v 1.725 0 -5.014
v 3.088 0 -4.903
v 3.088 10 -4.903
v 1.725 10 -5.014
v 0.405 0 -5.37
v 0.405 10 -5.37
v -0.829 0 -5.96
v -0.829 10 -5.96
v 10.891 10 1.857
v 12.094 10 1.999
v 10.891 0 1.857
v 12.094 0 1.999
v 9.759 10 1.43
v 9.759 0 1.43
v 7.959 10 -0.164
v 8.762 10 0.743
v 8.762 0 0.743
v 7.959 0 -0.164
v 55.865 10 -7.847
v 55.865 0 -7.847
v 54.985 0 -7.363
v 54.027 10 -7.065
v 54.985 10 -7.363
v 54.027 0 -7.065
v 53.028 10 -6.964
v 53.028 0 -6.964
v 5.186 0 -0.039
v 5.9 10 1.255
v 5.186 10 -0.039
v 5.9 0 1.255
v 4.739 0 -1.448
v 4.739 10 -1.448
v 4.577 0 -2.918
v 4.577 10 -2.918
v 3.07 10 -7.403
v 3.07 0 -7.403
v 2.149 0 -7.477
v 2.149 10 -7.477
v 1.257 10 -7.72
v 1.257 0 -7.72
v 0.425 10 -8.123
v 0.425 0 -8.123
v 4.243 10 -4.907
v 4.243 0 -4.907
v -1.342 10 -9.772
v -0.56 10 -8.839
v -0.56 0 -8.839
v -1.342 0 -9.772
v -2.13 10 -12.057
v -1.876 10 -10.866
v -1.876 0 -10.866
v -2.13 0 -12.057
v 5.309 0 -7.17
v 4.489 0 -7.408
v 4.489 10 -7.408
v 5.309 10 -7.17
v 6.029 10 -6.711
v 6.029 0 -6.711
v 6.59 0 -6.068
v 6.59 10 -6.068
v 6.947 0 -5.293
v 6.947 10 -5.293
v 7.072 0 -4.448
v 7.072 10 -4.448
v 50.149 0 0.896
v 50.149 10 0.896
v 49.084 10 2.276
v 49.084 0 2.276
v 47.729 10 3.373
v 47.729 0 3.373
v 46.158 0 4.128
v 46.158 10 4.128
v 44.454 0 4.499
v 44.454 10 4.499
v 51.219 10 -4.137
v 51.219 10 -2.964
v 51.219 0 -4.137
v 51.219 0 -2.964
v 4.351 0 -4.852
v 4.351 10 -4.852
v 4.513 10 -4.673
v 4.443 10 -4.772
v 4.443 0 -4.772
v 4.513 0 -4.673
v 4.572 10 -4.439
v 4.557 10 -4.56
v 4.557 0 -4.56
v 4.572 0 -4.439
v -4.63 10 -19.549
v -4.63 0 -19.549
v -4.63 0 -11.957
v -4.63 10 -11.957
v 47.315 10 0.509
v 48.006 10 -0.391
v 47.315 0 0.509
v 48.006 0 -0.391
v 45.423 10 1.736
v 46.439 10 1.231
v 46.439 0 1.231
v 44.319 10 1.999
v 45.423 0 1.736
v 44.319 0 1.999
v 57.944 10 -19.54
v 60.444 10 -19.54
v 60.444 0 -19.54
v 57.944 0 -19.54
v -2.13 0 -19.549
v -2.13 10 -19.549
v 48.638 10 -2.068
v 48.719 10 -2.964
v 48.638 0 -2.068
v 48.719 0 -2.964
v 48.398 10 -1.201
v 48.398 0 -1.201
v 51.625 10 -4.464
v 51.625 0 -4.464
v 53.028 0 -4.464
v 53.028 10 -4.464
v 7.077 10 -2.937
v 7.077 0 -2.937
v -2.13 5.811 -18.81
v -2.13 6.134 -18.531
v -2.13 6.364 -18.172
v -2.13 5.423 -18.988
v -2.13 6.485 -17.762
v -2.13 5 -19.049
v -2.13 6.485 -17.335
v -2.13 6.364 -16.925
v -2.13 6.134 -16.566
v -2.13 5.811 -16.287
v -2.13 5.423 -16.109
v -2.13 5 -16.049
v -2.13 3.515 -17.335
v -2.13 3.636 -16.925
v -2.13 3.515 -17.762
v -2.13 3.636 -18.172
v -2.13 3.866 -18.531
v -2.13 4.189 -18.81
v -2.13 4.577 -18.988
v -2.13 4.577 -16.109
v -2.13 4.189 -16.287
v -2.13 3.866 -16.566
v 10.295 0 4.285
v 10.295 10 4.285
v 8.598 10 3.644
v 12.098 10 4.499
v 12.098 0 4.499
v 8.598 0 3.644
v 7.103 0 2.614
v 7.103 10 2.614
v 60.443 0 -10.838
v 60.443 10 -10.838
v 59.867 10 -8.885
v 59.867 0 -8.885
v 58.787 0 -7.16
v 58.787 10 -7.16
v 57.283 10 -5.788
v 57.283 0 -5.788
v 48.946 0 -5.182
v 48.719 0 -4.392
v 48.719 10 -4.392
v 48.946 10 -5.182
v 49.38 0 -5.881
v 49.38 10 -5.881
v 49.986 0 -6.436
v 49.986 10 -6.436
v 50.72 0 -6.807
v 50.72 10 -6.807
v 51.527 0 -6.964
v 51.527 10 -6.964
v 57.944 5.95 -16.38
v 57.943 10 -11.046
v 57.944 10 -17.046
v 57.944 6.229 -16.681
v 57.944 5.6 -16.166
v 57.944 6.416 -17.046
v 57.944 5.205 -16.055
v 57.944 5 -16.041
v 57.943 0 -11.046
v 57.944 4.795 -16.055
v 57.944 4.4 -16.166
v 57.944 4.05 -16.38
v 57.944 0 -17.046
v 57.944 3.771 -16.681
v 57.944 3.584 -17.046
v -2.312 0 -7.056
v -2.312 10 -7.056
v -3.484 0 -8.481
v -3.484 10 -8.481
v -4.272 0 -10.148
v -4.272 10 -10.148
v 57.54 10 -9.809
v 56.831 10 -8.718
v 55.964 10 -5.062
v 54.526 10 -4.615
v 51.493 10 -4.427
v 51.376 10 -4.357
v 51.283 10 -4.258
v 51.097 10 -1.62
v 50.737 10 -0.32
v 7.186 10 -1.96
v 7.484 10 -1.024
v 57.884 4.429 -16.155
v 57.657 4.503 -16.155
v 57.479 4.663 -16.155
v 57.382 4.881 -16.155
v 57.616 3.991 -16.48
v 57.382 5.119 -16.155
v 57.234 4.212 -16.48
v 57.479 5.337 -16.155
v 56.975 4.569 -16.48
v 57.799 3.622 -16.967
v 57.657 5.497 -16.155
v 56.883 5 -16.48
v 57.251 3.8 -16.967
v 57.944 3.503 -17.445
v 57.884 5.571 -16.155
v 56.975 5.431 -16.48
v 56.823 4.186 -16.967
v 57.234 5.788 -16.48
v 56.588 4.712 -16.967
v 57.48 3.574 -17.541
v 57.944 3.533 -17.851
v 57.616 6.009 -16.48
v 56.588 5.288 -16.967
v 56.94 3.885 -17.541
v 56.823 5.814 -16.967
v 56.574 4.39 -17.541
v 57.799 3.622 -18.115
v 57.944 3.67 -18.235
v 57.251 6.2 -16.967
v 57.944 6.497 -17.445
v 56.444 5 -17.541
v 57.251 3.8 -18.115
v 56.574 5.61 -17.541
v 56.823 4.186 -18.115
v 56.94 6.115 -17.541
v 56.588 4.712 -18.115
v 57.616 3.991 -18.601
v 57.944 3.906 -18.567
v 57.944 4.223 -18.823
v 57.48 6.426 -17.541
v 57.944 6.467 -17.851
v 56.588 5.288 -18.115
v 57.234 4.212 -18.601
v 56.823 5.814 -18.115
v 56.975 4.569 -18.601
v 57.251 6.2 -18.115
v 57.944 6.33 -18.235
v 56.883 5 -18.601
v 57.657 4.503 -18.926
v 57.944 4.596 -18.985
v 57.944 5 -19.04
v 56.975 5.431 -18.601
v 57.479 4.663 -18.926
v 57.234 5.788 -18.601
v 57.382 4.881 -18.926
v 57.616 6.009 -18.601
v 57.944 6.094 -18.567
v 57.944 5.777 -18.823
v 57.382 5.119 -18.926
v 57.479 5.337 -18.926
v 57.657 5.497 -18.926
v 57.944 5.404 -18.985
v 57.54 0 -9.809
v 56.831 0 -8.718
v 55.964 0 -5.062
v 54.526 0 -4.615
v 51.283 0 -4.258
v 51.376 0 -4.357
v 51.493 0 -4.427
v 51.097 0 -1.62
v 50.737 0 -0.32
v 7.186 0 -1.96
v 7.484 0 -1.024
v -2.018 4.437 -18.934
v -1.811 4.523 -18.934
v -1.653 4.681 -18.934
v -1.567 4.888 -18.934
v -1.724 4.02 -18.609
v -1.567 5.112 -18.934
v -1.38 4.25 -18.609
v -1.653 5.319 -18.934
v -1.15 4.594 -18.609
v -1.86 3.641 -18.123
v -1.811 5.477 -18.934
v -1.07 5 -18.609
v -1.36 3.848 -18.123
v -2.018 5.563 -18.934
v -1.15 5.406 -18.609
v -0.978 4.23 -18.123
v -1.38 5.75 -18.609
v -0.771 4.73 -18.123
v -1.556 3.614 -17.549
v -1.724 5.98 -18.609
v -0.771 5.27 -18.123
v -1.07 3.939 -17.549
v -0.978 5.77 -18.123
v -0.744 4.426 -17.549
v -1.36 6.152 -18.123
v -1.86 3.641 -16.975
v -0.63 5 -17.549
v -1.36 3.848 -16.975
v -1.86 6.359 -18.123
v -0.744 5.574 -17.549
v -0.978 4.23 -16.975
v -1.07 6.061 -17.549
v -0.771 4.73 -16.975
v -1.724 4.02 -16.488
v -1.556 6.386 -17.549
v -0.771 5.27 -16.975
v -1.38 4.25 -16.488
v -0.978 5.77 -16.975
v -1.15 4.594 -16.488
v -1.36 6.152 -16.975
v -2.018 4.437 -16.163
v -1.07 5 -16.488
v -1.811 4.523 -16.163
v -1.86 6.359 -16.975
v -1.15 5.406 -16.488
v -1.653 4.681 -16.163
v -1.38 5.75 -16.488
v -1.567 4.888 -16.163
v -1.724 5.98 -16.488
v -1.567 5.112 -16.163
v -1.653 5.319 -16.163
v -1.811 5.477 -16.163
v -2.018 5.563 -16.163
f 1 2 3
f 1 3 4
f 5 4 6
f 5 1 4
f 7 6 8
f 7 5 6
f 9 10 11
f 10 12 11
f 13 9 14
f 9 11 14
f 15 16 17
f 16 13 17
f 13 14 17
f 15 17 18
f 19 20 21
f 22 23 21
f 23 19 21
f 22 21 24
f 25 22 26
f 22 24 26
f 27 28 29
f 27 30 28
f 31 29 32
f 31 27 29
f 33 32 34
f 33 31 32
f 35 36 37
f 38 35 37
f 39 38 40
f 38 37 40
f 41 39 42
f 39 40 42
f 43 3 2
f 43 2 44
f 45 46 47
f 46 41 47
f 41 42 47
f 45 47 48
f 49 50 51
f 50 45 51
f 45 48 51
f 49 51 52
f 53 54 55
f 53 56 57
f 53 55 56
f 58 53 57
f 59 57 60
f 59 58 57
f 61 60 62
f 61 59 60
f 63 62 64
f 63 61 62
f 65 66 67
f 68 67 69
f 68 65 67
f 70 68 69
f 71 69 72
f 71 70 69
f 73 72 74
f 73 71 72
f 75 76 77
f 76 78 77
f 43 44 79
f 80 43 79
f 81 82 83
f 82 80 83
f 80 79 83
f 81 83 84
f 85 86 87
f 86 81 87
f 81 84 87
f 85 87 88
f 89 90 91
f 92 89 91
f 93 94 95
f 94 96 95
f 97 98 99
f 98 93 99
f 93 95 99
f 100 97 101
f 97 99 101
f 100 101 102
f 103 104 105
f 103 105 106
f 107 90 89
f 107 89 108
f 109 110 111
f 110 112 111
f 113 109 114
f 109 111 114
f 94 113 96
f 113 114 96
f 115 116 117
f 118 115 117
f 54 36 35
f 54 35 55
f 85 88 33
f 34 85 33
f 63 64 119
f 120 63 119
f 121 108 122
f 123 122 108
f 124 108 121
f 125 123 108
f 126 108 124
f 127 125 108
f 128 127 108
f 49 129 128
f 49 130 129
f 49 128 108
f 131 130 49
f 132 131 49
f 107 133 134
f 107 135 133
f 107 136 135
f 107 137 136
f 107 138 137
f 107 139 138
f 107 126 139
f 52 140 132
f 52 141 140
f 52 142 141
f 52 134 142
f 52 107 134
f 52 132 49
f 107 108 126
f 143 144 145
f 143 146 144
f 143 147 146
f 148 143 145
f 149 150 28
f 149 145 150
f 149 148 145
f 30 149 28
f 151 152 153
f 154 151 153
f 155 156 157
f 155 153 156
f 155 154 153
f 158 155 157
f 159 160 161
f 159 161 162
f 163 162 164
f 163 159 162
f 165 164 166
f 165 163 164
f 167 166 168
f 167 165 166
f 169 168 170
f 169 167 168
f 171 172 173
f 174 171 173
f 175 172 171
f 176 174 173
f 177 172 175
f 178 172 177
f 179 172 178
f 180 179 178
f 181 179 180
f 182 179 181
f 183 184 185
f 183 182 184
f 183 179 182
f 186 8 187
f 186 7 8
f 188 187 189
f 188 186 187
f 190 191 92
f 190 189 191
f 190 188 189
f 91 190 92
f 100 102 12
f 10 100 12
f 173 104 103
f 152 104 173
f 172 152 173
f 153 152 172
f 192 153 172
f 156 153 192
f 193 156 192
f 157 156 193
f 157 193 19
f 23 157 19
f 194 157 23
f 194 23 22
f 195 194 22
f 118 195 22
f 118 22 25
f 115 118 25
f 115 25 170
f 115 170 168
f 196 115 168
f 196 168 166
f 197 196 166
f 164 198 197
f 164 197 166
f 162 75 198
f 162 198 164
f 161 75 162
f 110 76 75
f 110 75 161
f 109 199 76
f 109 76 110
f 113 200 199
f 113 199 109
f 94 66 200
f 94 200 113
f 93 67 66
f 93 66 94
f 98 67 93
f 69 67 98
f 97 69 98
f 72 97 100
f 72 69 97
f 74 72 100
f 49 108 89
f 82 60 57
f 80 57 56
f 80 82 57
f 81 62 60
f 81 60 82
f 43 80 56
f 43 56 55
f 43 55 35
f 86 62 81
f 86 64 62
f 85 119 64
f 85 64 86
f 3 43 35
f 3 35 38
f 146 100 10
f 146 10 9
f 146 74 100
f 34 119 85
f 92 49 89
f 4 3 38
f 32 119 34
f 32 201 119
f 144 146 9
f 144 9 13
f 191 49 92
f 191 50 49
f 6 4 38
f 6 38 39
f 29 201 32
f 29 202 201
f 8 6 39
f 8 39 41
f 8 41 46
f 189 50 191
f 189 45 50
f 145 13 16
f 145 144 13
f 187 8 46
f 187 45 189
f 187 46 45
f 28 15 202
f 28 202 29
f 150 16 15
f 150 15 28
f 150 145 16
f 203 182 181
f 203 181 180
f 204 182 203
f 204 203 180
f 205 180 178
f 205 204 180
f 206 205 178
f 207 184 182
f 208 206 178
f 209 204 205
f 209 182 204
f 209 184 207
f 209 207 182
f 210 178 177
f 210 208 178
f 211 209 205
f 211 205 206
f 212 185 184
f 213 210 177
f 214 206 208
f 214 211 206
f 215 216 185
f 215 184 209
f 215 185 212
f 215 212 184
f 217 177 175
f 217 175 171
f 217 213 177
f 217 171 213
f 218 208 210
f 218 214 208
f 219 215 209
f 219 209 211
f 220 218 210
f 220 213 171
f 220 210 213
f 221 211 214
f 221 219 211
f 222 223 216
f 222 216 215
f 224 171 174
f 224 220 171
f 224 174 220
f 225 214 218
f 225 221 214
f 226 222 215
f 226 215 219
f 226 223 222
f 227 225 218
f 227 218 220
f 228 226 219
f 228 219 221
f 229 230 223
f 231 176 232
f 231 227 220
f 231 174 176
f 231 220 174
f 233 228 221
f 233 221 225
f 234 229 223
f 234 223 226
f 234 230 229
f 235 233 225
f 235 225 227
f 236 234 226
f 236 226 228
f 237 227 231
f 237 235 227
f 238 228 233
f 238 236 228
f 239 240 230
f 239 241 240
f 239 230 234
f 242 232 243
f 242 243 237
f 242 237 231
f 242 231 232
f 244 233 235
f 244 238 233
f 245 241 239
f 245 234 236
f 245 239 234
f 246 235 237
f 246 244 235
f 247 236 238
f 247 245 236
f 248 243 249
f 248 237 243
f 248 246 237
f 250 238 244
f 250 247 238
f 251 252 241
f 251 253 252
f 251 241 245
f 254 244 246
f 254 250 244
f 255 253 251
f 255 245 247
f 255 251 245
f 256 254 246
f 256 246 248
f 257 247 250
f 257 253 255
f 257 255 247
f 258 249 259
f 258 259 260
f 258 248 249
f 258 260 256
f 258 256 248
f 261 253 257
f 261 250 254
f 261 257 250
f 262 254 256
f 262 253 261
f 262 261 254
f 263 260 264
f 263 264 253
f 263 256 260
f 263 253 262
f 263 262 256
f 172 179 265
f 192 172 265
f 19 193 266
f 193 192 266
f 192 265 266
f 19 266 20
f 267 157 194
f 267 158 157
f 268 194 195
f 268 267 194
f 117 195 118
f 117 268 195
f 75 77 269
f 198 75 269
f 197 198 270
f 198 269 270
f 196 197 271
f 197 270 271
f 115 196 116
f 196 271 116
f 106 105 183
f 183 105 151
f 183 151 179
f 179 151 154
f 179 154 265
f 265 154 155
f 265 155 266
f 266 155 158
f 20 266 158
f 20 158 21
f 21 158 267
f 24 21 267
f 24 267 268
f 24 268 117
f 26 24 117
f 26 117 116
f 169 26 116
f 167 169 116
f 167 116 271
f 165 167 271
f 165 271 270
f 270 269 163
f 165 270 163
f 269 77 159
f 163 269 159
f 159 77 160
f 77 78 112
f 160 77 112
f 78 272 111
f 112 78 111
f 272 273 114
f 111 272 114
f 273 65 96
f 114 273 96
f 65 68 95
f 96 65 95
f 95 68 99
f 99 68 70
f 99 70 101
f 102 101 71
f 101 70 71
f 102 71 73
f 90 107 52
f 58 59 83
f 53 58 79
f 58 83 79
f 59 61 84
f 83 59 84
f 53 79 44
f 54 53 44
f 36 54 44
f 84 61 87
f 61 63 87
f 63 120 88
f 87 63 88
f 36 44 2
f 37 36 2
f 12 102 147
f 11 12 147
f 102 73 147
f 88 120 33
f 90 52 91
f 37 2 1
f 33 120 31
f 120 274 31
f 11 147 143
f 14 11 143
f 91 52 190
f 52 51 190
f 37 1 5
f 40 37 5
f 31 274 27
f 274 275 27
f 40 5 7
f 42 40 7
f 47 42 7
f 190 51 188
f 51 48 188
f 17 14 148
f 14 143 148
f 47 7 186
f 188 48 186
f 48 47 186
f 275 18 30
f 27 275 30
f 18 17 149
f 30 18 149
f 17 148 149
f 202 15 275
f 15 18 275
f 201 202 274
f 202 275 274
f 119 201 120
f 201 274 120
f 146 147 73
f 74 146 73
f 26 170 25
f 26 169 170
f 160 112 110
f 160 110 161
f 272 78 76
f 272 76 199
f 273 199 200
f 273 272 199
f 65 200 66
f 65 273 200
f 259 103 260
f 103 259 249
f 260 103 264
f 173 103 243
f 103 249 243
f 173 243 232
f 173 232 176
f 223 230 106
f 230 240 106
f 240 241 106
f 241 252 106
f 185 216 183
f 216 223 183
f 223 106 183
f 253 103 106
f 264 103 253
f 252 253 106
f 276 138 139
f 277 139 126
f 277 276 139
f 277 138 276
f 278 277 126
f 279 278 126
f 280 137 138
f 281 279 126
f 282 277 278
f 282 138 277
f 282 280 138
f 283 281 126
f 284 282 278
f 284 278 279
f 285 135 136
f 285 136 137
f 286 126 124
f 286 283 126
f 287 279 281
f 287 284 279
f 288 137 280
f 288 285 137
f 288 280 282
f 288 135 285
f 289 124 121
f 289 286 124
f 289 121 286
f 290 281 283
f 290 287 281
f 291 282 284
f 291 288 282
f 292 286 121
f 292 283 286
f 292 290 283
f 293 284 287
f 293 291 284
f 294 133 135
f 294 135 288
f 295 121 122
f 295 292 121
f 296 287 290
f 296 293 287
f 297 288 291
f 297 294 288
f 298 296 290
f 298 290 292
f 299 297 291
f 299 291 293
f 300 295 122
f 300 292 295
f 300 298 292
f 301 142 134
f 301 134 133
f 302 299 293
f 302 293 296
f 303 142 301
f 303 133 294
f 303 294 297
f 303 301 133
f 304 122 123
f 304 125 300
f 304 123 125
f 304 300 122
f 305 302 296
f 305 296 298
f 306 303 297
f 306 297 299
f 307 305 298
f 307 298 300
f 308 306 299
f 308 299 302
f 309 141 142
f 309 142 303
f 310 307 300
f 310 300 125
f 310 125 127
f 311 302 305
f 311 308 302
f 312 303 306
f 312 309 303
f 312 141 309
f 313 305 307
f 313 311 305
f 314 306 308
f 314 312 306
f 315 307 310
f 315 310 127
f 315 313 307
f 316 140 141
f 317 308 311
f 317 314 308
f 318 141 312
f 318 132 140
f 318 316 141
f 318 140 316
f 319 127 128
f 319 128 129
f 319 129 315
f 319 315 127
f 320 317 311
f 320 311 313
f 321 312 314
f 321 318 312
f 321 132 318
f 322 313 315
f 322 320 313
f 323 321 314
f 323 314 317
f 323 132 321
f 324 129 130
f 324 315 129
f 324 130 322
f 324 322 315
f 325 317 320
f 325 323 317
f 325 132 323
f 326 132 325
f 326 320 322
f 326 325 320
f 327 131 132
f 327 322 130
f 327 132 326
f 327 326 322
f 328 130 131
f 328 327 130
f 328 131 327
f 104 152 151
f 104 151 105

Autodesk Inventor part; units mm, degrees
ref_plane "YZ Plane" through (0, 0, 0) normal (1, 0, 0) x (0, 1, 0)
ref_plane "XZ Plane" through (0, 0, 0) normal (0, 1, 0) x (-1, 0, 0)
ref_plane "XY Plane" through (0, 0, 0) normal (0, 0, 1) x (1, 0, 0)
sketch "Sketch1" plane through (0, 0, 0) normal (0, 1, 0) x (-1, 0, 0)
  arc A0 (-51.5269, -6.9638) -> (-48.7189, -4.3924) centre (-51.6928, -3.9638) ccw
  line L0 (-51.5269, -6.9638) -> (-53.0277, -6.9638)
  arc A1 (-53.0277, -6.9638) -> (-55.8647, -7.8466) centre (-53.0278, -11.9638) ccw
  arc A2 (-48.0059, -0.3912) -> (-48.7189, -2.9645) centre (-43.7189, -2.9645) ccw
  line L1 (-48.7189, -2.9645) -> (-48.7189, -4.3924)
  arc A3 (-44.3192, 1.9993) -> (-48.0059, -0.3912) centre (-43.7189, -2.9645) ccw
  arc A4 (-55.8647, -7.8466) -> (-57.9428, -11.046) centre (-53.0278, -11.9639) ccw
  arc A5 (-7.9592, -0.1638) -> (-12.0937, 1.9993) centre (-12.0765, -3.0006) ccw
  arc A6 (-7.0769, -2.9368) -> (-7.9592, -0.1638) centre (-12.0765, -3.0006) ccw
  arc A7 (-7.0717, -4.4481) -> (-4.4894, -7.4079) centre (-4.0718, -4.4371) ccw
  line L2 (-7.0717, -4.4481) -> (-7.0769, -2.9368)
  arc A8 (-0.4247, -8.1232) -> (-3.0701, -7.403) centre (-3.0107, -12.4029) ccw
  line L3 (-3.0701, -7.403) -> (-4.4894, -7.4079)
  arc A9 (2.1302, -12.0566) -> (-0.4247, -8.1232) centre (-2.8554, -12.4986) ccw
  line L4 (2.1302, -12.0566) -> (2.1302, -17.0566)
  line L5 (-57.9428, -11.046) -> (-57.9439, -17.046)
  line L6 (-57.9439, -17.046) -> (2.1302, -17.0566)
  line L7 (-44.3192, 1.9993) -> (-12.0937, 1.9993)
  arc A10 (-6.0769, -2.9289) -> (-7.1357, 0.4036) centre (-12.0765, -3.0006) ccw
  arc A11 (-7.1357, 0.4036) -> (-12.0953, 2.9993) centre (-12.0765, -3.0006) ccw
  line L8 (-12.0953, 2.9993) -> (-44.3767, 2.9993)
  arc A12 (-44.3767, 2.9993) -> (-48.8633, 0.1235) centre (-43.7189, -2.9645) ccw
  arc A13 (-48.8633, 0.1235) -> (-49.7189, -2.9645) centre (-43.7189, -2.9645) ccw
  line L9 (-49.7189, -2.9645) -> (-49.7189, -4.3135)
  arc A14 (-51.5573, -5.9638) -> (-49.7189, -4.3135) centre (-51.6928, -3.9638) ccw
  line L10 (-51.5573, -5.9638) -> (-53.0277, -5.9638)
  arc A15 (-53.0277, -5.9638) -> (-56.4321, -7.0231) centre (-53.0278, -11.9638) ccw
  arc A16 (-56.4321, -7.0231) -> (-58.9428, -10.9576) centre (-53.0278, -11.9639) ccw
  line L11 (-58.9428, -10.9576) -> (-58.9441, -18.0408)
  line L12 (3.1302, -18.0204) -> (3.1302, -12.0144)
  arc A17 (3.1302, -12.0144) -> (0.0768, -7.258) centre (-2.8554, -12.4986) ccw
  arc A18 (0.0768, -7.258) -> (-3.0776, -6.403) centre (-3.0107, -12.4029) ccw
  line L13 (-3.0776, -6.403) -> (-4.4139, -6.4076)
  arc A19 (-6.0717, -4.4446) -> (-4.4139, -6.4076) centre (-4.0718, -4.4371) ccw
  line L14 (-6.0717, -4.4446) -> (-6.0769, -2.9289)
  arc A20 (-4.577, -2.9177) -> (-5.9005, 1.2546) centre (-12.0765, -3.0006) ccw
  arc A21 (-5.9005, 1.2546) -> (-12.0976, 4.4993) centre (-12.0765, -3.0006) ccw
  line L15 (-12.0976, 4.4993) -> (-44.4545, 4.4993)
  arc A22 (-44.4545, 4.4993) -> (-50.1493, 0.8955) centre (-43.7189, -2.9645) ccw
  arc A23 (-50.1493, 0.8955) -> (-51.2189, -2.9645) centre (-43.7189, -2.9645) ccw
  line L16 (-51.2189, -2.9645) -> (-51.2189, -4.1372)
  arc A24 (-51.6249, -4.4638) -> (-51.2189, -4.1372) centre (-51.6928, -3.9638) ccw
  line L17 (-51.6249, -4.4638) -> (-53.0277, -4.4638)
  arc A25 (-53.0277, -4.4638) -> (-57.2832, -5.7879) centre (-53.0278, -11.9638) ccw
  arc A26 (-57.2832, -5.7879) -> (-60.4428, -10.8378) centre (-53.0278, -11.9639) ccw
  line L18 (-60.4428, -10.8378) -> (-60.4443, -19.5405)
  line L19 (4.6302, -19.5486) -> (4.6302, -11.9572)
  arc A27 (4.6302, -11.9572) -> (0.8291, -5.9601) centre (-2.8554, -12.4986) ccw
  arc A28 (0.8291, -5.9601) -> (-3.0882, -4.903) centre (-3.0107, -12.4029) ccw
  line L20 (-3.0882, -4.903) -> (-4.2426, -4.907)
  arc A29 (-4.5718, -4.4391) -> (-4.2426, -4.907) centre (-4.0718, -4.4371) ccw
  line L21 (-4.5718, -4.4391) -> (-4.577, -2.9177)
  line L22 (3.1302, -18.0204) -> (3.1302, -19.5486)
  line L23 (3.1302, -18.0204) -> (4.6584, -18.0204) construction
  line L24 (3.1302, -19.5486) -> (4.6302, -19.5486)
  line L25 (-58.9441, -18.0408) -> (-58.9441, -19.5405)
  line L26 (-58.9441, -19.5405) -> (-60.4443, -19.5405)
  line L27 (-58.9441, -19.5405) -> (-57.9439, -19.5405)
  line L28 (-57.9439, -19.5405) -> (-57.9439, -17.046)
  line L29 (3.1302, -19.5486) -> (2.1302, -19.5486)
  line L30 (2.1302, -19.5486) -> (2.1302, -17.0566)
  point P0 (0, 0)
  point P1 (0, 0)
  dimension "d5" = 5
  dimension "d6" = 6
  dimension "d8" = 3
  dimension "d11" = 1
  dimension "d12" = 1.5
  dimension "d13" = 90
  dimension "d16" = 1
extrude "Extrusion2" add sketch "Sketch1" along normal blind 10 contours L0 A1 A4 L5 L28 L27 L25 L11 A16 A15 L10 A14 L9 A13 A12 L8 A11 A10 L14 A19 L13 A18 A17 L12 L22 L29 L30 L4 A9 A8 L3 A7 L2 A6 A5 L7 A3 A2 L1 A0 | L26 L18 A26 A25 L17 A24 L16 A23 A22 L15 A21 A20 L21 A29 L20 A28 A27 L19 L24 L22 L12 A17 A18 L13 A19 L14 A10 A11 L8 A12 A13 L9 A14 L10 A15 A16 L11 L25
sketch "Sketch2" plane through (-2.1302, 0, -12.0566) normal (1, 0, 0) x (0, 0, -1)
  line L0 (7.492, 0) -> (7.492, 10) projected
  line L1 (7.492, 5) -> (5.492, 5)
  arc A0 (6.992, 5) -> (3.992, 5) centre (5.492, 5) ccw
  line L2 (5.492, 5) -> (3.992, 5)
  point P0 (-12.0566, 0)
  dimension "d19" = 2
  dimension "d21" = 1.5
revolve "Revolution1" add sketch "Sketch2" angle 360 about axis through (-2.1302, 5, -19.5486) along (0, 0, 1)
sketch "Sketch3" plane through (57.9439, 0, -19.5405) normal (-1, 0, 0) x (0, 0, 1)
  line L0 (0, 0) -> (0, 10) projected
  line L1 (0, 5) -> (2, 5)
  arc A0 (3.5, 5) -> (0.5, 5) centre (2, 5) ccw
  line L2 (2, 5) -> (3.5, 5)
  point P0 (19.5405, 0)
  point P1 (2, 5)
  dimension "d23" = 2
  dimension "d24" = 1.5
revolve "Revolution2" add sketch "Sketch3" angle 360 about axis through (57.9439, 5, -19.5405) along (0, 0, 1)
properties part number "NEMA23_Shroud_Cover"
